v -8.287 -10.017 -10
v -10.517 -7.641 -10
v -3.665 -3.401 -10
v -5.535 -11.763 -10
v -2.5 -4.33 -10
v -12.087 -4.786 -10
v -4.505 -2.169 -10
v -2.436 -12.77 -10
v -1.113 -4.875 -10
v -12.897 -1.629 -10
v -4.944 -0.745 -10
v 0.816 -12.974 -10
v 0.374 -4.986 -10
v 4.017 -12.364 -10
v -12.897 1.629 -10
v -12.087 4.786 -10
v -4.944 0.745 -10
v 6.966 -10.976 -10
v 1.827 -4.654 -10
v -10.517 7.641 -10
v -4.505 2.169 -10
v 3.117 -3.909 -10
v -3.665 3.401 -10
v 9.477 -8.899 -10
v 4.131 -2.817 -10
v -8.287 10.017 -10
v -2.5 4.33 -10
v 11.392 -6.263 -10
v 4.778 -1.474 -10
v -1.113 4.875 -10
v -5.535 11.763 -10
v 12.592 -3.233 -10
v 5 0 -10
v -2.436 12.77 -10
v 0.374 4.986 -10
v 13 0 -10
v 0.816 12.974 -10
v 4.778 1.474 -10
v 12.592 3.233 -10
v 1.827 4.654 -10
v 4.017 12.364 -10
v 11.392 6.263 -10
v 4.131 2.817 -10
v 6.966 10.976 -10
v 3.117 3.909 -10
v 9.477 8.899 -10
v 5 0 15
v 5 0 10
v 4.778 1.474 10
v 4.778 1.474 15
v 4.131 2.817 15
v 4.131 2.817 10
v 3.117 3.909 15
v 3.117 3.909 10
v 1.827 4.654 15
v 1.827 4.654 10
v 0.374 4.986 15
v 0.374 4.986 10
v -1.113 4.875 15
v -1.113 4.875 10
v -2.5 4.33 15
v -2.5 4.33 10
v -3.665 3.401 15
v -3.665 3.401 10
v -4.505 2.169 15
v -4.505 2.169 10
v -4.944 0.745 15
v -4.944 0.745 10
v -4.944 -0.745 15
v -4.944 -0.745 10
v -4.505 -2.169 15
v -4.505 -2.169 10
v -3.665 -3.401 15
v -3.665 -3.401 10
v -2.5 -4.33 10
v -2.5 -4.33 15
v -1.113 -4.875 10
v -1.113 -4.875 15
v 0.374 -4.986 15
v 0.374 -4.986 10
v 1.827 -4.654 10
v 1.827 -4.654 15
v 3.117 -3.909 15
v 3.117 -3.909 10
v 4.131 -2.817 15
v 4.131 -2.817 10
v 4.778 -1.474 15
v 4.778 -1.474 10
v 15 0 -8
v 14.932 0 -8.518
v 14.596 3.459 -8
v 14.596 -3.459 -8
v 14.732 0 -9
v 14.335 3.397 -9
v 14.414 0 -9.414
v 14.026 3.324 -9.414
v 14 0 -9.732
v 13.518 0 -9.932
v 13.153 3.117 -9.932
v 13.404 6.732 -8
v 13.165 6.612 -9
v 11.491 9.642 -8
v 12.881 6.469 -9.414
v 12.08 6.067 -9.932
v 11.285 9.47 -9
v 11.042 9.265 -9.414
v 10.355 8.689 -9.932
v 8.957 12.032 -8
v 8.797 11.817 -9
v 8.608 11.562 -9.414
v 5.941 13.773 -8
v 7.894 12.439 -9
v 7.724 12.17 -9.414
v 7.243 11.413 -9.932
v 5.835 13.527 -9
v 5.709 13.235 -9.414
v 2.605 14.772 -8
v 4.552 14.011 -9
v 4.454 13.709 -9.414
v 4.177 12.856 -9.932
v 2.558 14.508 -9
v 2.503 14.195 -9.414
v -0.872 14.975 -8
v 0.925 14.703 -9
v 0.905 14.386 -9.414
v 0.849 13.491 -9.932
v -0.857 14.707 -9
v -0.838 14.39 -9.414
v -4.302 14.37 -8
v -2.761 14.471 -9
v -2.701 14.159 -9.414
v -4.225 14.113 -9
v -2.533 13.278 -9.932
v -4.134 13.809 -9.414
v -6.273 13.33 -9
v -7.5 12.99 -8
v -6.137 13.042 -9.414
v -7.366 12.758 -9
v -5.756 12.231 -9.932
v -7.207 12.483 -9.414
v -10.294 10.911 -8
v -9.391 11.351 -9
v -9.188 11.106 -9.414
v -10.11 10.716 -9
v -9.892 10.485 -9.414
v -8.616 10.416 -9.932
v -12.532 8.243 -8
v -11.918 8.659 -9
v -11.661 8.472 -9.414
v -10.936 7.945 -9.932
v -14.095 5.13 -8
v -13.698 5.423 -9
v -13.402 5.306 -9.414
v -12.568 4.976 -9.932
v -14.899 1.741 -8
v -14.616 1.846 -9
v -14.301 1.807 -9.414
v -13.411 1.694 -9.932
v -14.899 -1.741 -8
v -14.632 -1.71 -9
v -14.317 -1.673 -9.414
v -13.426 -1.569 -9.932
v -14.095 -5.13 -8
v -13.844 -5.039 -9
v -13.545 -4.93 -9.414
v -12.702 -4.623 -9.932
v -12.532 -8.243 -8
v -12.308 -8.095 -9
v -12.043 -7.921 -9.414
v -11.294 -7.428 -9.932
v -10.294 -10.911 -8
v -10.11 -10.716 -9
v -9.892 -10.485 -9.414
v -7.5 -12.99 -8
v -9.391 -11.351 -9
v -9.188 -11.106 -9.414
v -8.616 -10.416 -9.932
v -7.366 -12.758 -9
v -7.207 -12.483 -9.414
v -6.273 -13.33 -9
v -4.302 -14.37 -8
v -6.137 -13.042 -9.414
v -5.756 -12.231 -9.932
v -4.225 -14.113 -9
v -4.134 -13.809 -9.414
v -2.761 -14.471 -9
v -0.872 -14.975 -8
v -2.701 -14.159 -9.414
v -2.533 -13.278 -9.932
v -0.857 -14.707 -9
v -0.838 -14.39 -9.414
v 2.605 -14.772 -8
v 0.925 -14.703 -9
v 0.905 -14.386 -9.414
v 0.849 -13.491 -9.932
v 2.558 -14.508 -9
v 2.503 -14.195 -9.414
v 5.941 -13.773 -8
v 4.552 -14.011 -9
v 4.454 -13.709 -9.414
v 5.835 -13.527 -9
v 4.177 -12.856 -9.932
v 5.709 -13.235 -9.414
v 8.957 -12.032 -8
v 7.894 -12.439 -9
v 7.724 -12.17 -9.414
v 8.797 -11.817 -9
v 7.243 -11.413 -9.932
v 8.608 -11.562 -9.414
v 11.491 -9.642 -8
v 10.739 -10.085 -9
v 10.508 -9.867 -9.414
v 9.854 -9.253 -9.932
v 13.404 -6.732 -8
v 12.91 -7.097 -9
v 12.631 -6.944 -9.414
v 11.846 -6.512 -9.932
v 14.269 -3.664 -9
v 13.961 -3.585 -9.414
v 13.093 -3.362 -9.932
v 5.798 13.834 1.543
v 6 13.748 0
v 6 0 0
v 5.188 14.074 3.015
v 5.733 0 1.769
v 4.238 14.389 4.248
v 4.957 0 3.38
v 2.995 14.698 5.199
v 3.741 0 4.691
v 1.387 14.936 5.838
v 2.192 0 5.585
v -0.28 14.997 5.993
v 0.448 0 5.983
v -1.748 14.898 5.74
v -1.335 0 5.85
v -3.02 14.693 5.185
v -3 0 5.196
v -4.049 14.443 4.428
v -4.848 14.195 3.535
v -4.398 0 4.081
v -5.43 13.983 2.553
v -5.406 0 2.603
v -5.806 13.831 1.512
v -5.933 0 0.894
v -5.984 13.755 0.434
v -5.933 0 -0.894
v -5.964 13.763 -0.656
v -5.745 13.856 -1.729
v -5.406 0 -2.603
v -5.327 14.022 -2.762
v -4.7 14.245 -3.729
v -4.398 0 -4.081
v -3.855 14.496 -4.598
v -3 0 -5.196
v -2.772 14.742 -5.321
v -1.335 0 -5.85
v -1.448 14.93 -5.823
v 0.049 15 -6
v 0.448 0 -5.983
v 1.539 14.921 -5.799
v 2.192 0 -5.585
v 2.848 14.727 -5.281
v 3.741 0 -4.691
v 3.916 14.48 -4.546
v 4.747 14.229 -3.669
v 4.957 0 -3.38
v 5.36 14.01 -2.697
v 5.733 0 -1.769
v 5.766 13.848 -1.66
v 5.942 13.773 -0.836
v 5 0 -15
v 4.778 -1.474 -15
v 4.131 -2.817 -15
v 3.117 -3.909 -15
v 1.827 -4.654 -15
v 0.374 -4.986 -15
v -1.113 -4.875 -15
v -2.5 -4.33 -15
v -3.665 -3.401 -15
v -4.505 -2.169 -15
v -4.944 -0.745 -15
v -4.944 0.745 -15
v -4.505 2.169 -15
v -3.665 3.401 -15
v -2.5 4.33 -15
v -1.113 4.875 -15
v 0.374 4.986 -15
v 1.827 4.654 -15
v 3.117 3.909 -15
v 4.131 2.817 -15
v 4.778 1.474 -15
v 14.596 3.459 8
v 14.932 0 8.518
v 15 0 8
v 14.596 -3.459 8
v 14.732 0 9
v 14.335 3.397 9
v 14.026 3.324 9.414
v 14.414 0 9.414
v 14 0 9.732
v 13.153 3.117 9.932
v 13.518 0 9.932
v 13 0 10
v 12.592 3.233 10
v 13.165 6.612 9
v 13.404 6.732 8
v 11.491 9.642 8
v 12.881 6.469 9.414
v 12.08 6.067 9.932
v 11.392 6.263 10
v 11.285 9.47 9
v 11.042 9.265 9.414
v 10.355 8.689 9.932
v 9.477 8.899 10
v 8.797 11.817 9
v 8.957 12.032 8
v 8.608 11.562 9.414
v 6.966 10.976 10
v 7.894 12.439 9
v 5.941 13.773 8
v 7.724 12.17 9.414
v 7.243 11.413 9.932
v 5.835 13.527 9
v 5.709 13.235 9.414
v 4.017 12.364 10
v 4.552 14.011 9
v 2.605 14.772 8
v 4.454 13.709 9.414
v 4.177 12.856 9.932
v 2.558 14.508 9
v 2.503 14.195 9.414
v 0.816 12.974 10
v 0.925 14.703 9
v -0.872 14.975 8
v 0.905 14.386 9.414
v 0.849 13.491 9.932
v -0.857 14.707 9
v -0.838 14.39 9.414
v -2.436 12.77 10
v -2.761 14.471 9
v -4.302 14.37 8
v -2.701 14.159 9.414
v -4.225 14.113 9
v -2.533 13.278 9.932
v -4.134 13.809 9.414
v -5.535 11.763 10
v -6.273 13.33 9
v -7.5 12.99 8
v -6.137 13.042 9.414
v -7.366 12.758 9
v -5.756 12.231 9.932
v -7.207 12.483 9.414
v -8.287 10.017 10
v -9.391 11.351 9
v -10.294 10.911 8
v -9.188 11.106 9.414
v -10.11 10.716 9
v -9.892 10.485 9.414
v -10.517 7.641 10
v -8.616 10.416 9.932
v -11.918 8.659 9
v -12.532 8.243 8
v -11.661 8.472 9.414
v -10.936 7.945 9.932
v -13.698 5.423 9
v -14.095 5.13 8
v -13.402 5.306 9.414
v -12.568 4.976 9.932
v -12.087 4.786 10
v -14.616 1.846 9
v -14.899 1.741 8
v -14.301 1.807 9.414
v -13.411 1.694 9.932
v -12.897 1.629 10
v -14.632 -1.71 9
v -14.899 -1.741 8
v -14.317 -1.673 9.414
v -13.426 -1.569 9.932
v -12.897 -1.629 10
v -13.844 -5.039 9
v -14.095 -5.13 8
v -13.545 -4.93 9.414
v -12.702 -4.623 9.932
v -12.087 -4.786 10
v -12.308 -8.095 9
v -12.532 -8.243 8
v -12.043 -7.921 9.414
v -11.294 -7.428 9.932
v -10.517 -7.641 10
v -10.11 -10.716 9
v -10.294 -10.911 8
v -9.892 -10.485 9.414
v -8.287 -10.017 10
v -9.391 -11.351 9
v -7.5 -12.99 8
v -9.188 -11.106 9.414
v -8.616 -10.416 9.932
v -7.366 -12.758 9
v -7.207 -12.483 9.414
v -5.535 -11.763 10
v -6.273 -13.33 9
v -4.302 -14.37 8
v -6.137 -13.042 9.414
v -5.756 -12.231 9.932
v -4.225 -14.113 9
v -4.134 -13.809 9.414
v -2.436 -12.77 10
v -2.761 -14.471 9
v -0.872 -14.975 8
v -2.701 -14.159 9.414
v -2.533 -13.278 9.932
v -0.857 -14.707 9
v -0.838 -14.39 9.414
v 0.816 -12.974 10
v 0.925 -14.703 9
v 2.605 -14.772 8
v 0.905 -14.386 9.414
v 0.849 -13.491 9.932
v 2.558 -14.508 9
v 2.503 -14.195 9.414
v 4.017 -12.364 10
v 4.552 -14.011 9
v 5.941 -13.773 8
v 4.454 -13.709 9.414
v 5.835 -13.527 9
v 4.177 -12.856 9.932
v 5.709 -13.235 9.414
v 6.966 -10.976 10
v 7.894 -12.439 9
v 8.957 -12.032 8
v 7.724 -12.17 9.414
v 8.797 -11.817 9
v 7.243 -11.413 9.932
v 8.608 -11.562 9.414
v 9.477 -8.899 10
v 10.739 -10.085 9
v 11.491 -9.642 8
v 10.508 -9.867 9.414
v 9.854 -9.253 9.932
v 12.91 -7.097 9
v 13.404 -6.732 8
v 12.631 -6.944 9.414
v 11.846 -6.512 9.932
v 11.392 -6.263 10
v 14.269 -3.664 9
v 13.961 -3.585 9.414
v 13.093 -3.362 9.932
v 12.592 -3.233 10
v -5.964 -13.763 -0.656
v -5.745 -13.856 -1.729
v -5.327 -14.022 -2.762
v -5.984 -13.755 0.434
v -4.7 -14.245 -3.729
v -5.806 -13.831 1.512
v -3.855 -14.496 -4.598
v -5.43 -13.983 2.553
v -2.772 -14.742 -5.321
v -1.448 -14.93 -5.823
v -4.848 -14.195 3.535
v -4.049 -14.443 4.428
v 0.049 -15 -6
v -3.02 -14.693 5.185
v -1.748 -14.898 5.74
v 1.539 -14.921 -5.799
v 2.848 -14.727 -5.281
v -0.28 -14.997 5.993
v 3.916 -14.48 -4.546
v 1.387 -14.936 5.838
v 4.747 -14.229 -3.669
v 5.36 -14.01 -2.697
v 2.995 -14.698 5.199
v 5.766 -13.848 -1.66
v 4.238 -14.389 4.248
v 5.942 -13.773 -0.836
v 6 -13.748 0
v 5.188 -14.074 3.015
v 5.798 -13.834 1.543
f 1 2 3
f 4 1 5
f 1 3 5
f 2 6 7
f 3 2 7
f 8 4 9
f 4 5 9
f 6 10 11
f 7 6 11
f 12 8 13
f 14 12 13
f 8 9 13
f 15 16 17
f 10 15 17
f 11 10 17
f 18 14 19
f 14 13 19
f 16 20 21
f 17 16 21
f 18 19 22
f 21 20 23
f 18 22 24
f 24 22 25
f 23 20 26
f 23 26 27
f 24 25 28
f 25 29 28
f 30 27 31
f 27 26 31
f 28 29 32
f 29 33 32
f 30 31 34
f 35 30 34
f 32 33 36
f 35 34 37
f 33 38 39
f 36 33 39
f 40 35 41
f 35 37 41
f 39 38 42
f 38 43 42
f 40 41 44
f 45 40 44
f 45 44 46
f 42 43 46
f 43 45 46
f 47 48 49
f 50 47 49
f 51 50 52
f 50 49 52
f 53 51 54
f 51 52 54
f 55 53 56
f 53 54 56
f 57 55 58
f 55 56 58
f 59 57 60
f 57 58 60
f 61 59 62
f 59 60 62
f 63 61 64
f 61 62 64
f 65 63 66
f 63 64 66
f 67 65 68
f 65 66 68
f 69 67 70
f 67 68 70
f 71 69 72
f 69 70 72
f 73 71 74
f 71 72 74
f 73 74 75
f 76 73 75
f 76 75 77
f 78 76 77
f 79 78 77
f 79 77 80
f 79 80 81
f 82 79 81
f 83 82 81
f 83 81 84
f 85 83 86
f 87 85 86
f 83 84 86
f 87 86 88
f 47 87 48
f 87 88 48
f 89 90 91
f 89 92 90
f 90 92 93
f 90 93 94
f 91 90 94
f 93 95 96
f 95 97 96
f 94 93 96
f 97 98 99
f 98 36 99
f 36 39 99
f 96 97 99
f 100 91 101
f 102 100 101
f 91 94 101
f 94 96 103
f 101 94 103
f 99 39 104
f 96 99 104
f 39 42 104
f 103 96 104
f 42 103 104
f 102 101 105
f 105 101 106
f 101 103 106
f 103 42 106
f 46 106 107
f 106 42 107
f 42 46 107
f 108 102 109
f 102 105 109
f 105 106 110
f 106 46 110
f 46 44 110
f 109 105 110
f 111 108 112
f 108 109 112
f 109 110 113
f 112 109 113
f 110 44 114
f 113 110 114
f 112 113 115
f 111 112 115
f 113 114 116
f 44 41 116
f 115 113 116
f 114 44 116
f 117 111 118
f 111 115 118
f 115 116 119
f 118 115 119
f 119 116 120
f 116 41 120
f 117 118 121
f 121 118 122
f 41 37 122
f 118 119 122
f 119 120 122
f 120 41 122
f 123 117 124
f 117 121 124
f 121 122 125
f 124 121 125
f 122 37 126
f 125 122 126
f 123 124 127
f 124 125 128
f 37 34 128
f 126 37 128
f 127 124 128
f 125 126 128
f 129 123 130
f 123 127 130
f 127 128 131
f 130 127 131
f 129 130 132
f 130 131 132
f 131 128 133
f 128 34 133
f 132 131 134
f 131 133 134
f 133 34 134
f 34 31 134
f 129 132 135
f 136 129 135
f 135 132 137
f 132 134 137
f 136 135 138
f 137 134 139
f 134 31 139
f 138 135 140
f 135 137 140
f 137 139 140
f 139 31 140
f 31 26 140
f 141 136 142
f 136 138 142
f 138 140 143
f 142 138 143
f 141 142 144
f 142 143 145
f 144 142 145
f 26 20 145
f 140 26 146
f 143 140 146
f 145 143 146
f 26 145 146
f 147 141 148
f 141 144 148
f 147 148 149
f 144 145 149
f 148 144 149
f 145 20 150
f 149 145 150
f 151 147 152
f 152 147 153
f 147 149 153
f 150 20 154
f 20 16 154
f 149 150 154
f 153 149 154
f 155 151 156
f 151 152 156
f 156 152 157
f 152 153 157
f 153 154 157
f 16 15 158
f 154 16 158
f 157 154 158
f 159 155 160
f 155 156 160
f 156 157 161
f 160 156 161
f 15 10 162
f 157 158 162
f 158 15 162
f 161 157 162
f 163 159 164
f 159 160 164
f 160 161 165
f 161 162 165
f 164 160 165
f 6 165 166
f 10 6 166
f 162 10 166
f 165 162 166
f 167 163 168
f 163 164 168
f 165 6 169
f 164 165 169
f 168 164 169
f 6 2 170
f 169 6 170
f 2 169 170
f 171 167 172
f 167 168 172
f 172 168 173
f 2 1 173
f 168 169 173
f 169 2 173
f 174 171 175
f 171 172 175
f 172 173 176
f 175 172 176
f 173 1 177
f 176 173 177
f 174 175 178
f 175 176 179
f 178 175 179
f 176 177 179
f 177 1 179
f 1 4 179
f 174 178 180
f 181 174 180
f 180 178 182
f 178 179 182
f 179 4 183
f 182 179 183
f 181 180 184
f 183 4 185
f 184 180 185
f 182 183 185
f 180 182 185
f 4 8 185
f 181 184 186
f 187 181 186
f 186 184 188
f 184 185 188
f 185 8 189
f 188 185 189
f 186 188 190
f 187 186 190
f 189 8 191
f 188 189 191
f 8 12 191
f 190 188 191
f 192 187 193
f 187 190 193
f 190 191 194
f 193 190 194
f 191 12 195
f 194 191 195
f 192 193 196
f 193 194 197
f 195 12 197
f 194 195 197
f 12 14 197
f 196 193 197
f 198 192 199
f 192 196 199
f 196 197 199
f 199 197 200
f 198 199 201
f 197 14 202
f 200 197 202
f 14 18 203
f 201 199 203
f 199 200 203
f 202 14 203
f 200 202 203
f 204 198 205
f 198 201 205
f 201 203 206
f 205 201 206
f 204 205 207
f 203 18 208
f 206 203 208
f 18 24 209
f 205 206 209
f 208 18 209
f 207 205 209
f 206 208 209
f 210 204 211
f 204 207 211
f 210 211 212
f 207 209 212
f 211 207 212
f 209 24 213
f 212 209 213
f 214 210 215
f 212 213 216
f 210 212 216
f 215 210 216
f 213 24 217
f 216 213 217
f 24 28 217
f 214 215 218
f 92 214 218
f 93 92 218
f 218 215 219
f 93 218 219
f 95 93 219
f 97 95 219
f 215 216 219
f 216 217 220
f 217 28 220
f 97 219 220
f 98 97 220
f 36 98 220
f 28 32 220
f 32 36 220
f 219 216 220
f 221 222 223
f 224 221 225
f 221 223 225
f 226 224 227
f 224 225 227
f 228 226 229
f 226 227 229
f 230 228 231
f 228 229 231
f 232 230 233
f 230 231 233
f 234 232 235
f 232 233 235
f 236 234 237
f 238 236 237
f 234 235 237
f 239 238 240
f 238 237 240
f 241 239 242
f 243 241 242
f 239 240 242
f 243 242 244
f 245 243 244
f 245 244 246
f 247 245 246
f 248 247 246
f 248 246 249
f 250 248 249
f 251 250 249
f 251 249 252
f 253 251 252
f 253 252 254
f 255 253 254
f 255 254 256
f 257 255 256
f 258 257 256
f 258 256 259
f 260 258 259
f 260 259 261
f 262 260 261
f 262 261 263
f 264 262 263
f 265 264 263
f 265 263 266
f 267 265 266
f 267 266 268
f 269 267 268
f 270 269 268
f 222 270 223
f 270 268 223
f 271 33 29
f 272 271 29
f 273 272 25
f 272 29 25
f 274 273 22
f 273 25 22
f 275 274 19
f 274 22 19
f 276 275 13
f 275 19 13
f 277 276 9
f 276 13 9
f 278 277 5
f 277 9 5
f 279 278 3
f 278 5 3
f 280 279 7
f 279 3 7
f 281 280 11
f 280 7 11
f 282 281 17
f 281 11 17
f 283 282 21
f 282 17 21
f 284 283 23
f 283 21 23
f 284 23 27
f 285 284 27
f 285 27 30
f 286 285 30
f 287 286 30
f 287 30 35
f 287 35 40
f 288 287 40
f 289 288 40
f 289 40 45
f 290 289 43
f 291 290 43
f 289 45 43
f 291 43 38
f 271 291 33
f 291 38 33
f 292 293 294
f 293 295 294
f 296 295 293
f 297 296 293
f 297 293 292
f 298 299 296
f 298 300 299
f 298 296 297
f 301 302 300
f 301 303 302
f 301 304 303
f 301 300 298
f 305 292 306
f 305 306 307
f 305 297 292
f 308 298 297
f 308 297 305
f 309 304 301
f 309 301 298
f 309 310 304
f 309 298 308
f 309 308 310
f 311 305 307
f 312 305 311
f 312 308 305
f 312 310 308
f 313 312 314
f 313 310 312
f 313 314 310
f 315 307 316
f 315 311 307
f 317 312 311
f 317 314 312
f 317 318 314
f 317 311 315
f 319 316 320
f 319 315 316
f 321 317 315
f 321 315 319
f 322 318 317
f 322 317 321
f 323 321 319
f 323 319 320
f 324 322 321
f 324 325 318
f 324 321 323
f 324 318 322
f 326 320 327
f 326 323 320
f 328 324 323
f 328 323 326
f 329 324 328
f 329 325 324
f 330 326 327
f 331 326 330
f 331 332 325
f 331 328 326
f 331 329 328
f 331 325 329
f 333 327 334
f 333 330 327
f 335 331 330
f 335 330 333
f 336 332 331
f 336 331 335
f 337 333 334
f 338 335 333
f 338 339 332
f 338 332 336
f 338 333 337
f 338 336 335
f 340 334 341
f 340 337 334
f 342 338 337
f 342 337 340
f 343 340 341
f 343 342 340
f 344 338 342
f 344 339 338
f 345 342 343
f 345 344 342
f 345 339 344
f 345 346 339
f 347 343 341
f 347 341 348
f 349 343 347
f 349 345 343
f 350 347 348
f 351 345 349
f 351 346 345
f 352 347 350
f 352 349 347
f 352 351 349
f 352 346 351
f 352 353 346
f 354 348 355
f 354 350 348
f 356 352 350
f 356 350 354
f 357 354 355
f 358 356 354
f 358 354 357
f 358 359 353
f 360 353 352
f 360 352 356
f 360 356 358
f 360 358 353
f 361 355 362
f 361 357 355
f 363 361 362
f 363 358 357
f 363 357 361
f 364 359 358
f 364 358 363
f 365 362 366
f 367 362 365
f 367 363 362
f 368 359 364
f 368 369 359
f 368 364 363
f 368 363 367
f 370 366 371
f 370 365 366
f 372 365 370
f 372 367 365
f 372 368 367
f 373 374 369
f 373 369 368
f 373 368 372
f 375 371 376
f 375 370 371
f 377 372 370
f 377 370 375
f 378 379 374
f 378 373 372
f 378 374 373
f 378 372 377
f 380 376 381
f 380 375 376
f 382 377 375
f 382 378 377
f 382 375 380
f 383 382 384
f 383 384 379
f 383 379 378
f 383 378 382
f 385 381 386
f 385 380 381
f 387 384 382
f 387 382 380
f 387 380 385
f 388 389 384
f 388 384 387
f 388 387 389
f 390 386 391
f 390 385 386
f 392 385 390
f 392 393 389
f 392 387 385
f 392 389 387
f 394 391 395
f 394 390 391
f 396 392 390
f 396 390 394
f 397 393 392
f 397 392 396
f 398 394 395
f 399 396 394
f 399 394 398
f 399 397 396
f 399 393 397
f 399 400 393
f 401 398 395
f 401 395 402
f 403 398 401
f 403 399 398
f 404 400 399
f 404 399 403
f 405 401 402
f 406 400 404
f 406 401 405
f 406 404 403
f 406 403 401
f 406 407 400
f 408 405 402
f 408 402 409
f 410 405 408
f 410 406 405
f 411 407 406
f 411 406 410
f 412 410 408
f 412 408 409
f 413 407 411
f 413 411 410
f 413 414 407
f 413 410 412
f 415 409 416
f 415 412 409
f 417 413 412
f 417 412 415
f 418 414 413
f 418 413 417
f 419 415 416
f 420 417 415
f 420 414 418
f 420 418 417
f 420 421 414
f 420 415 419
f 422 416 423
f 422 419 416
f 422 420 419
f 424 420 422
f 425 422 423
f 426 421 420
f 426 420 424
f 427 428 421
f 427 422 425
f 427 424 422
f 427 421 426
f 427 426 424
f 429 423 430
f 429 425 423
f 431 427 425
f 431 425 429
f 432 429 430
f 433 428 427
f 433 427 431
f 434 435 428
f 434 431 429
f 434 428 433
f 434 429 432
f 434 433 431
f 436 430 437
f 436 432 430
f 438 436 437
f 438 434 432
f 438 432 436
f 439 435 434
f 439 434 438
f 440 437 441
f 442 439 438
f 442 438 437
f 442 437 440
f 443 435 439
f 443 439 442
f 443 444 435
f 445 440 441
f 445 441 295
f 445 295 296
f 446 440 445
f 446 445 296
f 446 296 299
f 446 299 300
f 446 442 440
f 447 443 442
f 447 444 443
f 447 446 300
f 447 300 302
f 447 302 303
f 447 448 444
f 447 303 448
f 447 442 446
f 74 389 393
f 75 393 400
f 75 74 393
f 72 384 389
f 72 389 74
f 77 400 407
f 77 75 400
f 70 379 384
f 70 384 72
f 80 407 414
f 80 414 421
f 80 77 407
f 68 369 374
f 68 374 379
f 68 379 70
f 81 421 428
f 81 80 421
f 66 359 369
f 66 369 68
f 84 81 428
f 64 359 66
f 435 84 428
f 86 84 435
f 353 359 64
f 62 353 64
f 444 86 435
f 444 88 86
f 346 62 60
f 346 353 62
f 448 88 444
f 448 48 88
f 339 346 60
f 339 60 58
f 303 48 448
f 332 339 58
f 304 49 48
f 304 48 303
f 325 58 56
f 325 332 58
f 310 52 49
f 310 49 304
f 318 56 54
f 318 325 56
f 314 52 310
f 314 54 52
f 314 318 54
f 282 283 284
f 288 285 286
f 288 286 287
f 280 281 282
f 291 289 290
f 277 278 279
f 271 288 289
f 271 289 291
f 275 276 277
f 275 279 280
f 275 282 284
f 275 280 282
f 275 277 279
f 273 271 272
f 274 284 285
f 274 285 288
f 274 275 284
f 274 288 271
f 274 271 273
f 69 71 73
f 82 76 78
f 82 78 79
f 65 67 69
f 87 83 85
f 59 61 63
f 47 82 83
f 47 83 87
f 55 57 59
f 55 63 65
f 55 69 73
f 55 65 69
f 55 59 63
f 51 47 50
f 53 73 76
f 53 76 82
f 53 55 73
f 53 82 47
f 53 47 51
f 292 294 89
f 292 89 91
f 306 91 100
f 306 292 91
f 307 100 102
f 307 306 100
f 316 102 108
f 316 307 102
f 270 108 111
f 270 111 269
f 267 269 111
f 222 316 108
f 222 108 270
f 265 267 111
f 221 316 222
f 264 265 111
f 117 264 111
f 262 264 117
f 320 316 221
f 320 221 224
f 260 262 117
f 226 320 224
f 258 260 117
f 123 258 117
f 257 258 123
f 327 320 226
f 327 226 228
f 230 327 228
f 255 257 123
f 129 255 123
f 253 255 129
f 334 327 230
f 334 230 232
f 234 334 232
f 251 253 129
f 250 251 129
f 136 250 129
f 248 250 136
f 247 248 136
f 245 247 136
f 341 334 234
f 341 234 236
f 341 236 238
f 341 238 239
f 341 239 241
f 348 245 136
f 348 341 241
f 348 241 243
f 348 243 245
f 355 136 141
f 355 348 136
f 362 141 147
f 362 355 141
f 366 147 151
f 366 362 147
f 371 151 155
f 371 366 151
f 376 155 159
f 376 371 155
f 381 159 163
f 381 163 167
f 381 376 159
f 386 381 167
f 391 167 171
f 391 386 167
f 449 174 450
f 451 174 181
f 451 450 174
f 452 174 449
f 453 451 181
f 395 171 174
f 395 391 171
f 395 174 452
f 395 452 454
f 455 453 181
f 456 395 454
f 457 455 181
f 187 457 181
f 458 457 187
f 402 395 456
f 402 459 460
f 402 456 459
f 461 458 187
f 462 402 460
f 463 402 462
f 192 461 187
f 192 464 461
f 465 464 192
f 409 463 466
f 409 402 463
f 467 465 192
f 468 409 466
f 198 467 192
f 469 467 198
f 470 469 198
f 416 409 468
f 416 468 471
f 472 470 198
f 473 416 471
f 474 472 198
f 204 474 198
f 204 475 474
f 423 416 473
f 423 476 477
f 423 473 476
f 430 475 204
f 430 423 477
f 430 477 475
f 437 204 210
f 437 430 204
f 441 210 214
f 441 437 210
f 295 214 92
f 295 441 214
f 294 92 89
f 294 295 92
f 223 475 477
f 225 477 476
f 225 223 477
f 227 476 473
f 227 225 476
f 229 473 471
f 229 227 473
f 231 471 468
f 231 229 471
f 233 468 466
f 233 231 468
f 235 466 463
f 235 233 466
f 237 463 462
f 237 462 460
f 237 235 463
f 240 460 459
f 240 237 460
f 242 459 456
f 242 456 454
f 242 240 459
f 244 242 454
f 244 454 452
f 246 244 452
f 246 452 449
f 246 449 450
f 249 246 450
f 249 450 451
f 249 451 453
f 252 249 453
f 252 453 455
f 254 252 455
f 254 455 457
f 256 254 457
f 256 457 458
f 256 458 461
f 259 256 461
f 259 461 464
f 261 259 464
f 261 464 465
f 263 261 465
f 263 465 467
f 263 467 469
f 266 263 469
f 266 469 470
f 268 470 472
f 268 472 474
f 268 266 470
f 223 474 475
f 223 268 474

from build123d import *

# Parameters (mm, degrees)
F0_R          = 15
F1_DEPTH      = 10
F2_R          = 2
F3_R          = 5
F4_DEPTH      = 5
F5_R          = 5
F6_DEPTH      = 5
F7_R          = 6
F8_DEPTH      = 15.001
F8_DEPTH_BACK = 15.001


with BuildPart() as f1:
    # F0 (on Top) → F1 (new body, symmetric)
    with BuildSketch(Plane.XY):
        Circle(F0_R)
    extrude(amount=F1_DEPTH, both=True)

    # F2
    f2_edges = [f1.edges().sort_by_distance(p)[0] for p in [
        (-15, 0, 10),
        (-15, 0, -10),
    ]]
    fillet(f2_edges, radius=F2_R)

    # F3 (on face) → F4 (join)
    with BuildSketch(Plane.XY.offset(10)):
        Circle(F3_R)
    extrude(amount=F4_DEPTH)

    # F5 (on face) → F6 (join)
    with BuildSketch(Plane(origin=(0, 0, -10), x_dir=(1, 0, 0), z_dir=(0, 0, -1))):
        Circle(F5_R)
    extrude(amount=F6_DEPTH)

    # F7 (on Front) → F8 (cut, two sides)
    with BuildSketch(Plane.XZ) as f8_sk:
        Circle(F7_R)
    extrude(amount=F8_DEPTH, mode=Mode.SUBTRACT)
    extrude(f8_sk.sketch, amount=-F8_DEPTH_BACK, mode=Mode.SUBTRACT)


solid = f1.part
